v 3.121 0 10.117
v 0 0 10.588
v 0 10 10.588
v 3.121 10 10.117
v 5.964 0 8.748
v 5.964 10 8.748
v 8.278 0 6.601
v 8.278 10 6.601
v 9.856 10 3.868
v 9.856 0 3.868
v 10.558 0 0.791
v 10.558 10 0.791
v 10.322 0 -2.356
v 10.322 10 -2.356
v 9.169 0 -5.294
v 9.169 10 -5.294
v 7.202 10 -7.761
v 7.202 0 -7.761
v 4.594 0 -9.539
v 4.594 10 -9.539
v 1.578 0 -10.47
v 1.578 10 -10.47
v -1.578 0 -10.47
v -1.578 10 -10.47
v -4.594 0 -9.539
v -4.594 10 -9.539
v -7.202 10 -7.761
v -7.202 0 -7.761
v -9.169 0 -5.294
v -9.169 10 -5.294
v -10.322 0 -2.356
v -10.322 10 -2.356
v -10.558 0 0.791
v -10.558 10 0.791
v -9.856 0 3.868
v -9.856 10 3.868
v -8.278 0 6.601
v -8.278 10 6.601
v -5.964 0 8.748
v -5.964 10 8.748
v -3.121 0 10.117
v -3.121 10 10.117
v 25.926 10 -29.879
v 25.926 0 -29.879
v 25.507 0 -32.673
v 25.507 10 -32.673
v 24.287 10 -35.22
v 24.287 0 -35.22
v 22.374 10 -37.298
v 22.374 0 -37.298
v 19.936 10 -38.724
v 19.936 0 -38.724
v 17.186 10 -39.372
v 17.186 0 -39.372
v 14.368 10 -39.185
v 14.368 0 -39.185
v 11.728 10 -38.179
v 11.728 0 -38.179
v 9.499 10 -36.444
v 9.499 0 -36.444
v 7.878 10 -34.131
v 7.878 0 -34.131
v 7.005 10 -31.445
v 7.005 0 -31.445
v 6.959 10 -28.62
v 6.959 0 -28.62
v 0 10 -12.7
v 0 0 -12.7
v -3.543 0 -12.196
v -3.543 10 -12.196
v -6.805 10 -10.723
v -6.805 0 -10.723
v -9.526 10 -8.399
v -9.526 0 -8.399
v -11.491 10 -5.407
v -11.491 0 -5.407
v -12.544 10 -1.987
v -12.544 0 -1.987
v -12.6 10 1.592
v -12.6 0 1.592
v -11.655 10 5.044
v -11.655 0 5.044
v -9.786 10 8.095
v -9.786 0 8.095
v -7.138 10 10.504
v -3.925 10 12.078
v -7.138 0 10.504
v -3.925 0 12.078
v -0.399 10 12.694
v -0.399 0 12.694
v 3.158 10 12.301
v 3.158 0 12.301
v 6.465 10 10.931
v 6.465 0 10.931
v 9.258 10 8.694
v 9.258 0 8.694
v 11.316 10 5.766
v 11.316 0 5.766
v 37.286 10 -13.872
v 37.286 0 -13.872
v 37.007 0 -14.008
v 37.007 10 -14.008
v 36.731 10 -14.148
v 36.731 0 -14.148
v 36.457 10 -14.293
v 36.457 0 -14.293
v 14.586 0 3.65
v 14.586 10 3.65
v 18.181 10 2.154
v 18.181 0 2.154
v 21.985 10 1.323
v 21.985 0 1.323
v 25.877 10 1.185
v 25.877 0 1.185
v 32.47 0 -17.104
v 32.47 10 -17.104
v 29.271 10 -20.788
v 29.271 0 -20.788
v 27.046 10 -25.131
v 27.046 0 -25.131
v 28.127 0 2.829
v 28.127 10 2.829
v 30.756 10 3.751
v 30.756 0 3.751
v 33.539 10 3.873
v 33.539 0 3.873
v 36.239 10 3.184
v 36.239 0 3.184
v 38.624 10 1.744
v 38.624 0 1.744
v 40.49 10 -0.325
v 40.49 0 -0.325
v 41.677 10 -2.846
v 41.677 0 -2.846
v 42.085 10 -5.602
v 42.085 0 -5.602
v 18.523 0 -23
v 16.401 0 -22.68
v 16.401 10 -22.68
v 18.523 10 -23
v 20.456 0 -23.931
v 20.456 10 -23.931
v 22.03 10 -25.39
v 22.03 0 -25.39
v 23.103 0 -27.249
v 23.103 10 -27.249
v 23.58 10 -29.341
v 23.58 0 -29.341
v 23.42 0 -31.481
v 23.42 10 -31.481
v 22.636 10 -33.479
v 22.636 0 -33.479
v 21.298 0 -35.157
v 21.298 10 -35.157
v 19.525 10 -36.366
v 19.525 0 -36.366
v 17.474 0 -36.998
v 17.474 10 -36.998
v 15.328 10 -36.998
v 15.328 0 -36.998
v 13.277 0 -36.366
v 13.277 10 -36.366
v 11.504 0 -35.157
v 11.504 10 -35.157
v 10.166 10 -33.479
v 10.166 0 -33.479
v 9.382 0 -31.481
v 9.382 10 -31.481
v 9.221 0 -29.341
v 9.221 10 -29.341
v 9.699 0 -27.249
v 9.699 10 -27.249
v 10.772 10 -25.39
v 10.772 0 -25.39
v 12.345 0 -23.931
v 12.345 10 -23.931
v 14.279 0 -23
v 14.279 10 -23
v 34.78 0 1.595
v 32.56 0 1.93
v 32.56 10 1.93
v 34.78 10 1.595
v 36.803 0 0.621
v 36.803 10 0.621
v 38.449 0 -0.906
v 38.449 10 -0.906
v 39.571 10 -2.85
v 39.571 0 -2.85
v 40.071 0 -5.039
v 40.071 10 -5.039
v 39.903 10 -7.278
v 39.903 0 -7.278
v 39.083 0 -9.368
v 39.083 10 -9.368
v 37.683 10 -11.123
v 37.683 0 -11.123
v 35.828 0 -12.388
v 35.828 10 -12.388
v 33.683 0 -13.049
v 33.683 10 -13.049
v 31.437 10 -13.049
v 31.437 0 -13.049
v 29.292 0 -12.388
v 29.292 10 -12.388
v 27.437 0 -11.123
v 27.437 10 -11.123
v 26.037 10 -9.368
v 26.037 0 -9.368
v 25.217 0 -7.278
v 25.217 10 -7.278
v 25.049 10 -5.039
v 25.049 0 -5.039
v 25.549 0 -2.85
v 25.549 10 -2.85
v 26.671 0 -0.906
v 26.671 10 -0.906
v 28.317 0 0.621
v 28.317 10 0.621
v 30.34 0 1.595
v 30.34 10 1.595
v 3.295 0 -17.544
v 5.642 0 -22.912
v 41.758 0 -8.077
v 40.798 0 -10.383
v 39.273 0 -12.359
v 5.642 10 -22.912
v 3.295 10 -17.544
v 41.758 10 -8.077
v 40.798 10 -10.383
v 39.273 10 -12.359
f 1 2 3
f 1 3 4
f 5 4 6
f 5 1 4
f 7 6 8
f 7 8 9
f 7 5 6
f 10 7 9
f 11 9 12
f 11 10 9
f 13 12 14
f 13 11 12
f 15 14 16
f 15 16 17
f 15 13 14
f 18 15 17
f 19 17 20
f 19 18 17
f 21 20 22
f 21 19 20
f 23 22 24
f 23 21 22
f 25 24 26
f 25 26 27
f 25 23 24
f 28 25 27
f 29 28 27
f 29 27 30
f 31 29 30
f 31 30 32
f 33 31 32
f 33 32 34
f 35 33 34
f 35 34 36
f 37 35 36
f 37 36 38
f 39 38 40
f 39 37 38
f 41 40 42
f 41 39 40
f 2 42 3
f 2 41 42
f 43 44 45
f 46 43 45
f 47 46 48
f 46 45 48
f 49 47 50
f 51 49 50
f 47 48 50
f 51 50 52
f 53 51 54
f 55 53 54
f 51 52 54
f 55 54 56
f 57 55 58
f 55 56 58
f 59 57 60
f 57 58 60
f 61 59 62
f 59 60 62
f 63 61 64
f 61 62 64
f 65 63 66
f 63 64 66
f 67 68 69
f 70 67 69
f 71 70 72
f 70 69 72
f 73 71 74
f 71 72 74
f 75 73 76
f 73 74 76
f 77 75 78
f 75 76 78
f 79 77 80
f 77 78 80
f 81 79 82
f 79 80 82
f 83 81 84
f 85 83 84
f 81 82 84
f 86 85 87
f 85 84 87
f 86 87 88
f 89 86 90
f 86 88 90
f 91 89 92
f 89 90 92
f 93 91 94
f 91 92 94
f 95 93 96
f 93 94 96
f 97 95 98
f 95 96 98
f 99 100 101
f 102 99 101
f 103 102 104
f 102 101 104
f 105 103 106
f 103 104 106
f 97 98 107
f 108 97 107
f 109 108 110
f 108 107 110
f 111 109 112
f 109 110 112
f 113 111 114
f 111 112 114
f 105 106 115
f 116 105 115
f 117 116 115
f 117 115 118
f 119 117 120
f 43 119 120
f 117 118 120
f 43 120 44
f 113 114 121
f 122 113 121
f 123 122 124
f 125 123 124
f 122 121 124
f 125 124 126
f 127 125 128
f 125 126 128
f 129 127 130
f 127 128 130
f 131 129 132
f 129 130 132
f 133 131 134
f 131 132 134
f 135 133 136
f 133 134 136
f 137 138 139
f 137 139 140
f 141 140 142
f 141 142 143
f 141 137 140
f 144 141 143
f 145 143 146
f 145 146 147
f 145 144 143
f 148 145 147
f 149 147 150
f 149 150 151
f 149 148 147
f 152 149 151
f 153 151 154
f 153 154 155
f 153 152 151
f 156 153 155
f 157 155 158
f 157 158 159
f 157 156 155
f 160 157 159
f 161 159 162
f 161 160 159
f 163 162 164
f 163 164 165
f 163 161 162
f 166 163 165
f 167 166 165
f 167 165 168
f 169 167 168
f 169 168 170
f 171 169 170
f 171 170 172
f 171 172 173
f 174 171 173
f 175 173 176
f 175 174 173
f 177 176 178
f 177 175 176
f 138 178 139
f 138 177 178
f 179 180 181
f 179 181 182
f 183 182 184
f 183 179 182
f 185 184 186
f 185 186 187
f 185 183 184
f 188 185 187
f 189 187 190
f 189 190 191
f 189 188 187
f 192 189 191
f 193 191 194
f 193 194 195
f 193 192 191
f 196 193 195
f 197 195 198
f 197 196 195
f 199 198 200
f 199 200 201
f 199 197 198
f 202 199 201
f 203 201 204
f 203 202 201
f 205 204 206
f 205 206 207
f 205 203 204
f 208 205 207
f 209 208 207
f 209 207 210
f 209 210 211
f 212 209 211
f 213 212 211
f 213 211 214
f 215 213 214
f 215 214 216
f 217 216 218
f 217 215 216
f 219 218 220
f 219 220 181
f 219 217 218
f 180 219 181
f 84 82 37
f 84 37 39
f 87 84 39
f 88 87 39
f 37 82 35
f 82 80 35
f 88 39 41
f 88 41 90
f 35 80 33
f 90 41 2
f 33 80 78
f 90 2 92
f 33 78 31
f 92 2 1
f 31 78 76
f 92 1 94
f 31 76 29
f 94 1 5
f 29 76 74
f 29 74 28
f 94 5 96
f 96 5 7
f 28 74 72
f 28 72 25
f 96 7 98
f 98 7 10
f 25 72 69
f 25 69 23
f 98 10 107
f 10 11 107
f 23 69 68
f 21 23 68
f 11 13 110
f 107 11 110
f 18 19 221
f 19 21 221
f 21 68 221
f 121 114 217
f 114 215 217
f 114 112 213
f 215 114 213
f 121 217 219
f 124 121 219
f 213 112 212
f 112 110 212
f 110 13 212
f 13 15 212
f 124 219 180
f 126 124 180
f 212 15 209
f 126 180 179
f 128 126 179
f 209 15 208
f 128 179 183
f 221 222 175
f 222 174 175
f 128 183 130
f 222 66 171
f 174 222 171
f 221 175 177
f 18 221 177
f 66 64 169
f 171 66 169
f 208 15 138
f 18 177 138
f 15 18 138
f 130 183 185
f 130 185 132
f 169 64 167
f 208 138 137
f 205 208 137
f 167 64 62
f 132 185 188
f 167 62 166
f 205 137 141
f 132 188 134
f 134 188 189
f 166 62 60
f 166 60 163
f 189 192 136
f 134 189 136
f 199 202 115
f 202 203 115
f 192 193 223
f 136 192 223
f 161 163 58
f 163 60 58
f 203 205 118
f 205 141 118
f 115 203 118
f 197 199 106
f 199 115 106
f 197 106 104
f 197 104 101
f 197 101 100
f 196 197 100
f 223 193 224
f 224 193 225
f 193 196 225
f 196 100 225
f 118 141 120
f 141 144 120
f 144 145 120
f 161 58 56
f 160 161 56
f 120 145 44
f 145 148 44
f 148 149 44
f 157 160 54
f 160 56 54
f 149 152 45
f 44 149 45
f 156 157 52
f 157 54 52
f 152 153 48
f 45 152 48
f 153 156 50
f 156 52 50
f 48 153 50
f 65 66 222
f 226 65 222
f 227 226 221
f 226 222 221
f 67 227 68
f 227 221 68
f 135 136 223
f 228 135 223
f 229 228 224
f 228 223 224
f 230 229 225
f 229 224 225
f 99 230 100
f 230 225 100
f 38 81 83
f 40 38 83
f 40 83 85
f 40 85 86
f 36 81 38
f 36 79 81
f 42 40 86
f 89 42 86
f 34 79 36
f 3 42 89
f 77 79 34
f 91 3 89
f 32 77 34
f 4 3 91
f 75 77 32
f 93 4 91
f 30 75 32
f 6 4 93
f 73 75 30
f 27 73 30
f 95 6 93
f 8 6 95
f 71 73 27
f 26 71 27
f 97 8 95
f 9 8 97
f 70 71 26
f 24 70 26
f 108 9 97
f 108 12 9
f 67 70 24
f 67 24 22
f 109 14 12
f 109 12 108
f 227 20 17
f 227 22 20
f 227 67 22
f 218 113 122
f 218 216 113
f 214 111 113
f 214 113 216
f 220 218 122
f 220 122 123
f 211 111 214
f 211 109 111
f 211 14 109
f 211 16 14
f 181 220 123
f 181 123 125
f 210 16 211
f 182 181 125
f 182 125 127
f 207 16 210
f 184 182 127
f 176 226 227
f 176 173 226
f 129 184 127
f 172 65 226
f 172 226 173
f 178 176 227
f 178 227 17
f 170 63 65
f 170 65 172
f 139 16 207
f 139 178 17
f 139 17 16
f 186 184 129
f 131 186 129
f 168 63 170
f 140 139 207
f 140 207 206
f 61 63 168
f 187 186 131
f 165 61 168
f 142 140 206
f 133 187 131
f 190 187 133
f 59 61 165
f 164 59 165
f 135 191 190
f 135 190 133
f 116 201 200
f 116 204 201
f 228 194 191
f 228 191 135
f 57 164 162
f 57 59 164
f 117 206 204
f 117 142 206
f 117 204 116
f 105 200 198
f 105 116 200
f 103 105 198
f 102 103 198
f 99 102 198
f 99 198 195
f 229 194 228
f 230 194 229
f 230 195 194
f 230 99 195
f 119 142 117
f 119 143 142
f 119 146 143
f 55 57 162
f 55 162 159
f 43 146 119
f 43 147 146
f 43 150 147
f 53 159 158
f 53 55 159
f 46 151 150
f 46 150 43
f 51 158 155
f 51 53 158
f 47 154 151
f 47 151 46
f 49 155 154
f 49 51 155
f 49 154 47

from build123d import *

# Parameters (mm, degrees)
SKETCH1_R           = 12.7
SKETCH1_R_2         = 10.587882435
SKETCH1_R_3         = 9.525
SKETCH1_R_4         = 7.199480632
SKETCH1_R_5         = 7.531788478
BOSS_EXTRUDE1_DEPTH = 10


with BuildPart() as part:
    # Sketch1 → Boss-Extrude1 (new body)
    # profile 1 of 4: a face of its own
    with BuildSketch(Plane(origin=(0, 0, 0), x_dir=(1, 0, 0), z_dir=(0, 1, 0))):
        with BuildLine():
            ThreePointArc((0, 12.7), (8.980256121, 8.980256121), (12.7, 0))
            ThreePointArc((12.7, 0), (12.349099919, -2.964748082), (11.315790364, -5.765664614))
            ThreePointArc((11.315790364, -5.765664614), (18.18064615, -2.153516868), (25.877180845, -1.185420811))
            ThreePointArc((25.877180845, -1.185420811), (24.696409251, 10.976736126), (36.457129285, 14.293021273))
            ThreePointArc((36.457129285, 14.293021273), (29.270833309, 20.788359993), (25.925837497, 29.879194827))
            ThreePointArc((25.925837497, 29.879194827), (17.031652126, 20.375106343), (6.959391743, 28.620335393))
            ThreePointArc((6.959391743, 28.620335393), (4.592983555, 20.173506773), (0, 12.7))
        make_face()
    # profile 2 of 4: a face of its own
    with BuildSketch(Plane(origin=(0, 0, 0), x_dir=(1, 0, 0), z_dir=(0, 1, 0))):
        Circle(SKETCH1_R)
        with Locations(Location((0, 0, 0), (0, 0, 270))):
            Circle(SKETCH1_R_2, mode=Mode.SUBTRACT)
    # profile 3 of 4: a face of its own
    with BuildSketch(Plane(origin=(0, 0, 0), x_dir=(1, 0, 0), z_dir=(0, 1, 0))):
        with Locations((16.400837497, 29.879194827)):
            Circle(SKETCH1_R_3)
        with Locations(Location((16.400837497, 29.879194827, 0), (0, 0, 270))):
            Circle(SKETCH1_R_4, mode=Mode.SUBTRACT)
    # profile 4 of 4: a face of its own
    with BuildSketch(Plane(origin=(0, 0, 0), x_dir=(1, 0, 0), z_dir=(0, 1, 0))):
        with BuildLine():
            ThreePointArc((36.457129285, 14.293021273), (24.696409251, 10.976736126), (25.877180845, -1.185420811))
            ThreePointArc((25.877180845, -1.185420811), (36.239101244, -3.183980484), (42.084961355, 5.601778145))
            ThreePointArc((42.084961355, 5.601778145), (40.798229992, 10.382631088), (37.285684743, 13.871794073))
            ThreePointArc((37.285684743, 13.871794073), (36.8689887, 14.077650841), (36.457129285, 14.293021273))
        make_face()
        with Locations(Location((32.559961355, 5.601778145, 0), (0, 0, 270))):
            Circle(SKETCH1_R_5, mode=Mode.SUBTRACT)
    extrude(amount=BOSS_EXTRUDE1_DEPTH)


solid = part.part
